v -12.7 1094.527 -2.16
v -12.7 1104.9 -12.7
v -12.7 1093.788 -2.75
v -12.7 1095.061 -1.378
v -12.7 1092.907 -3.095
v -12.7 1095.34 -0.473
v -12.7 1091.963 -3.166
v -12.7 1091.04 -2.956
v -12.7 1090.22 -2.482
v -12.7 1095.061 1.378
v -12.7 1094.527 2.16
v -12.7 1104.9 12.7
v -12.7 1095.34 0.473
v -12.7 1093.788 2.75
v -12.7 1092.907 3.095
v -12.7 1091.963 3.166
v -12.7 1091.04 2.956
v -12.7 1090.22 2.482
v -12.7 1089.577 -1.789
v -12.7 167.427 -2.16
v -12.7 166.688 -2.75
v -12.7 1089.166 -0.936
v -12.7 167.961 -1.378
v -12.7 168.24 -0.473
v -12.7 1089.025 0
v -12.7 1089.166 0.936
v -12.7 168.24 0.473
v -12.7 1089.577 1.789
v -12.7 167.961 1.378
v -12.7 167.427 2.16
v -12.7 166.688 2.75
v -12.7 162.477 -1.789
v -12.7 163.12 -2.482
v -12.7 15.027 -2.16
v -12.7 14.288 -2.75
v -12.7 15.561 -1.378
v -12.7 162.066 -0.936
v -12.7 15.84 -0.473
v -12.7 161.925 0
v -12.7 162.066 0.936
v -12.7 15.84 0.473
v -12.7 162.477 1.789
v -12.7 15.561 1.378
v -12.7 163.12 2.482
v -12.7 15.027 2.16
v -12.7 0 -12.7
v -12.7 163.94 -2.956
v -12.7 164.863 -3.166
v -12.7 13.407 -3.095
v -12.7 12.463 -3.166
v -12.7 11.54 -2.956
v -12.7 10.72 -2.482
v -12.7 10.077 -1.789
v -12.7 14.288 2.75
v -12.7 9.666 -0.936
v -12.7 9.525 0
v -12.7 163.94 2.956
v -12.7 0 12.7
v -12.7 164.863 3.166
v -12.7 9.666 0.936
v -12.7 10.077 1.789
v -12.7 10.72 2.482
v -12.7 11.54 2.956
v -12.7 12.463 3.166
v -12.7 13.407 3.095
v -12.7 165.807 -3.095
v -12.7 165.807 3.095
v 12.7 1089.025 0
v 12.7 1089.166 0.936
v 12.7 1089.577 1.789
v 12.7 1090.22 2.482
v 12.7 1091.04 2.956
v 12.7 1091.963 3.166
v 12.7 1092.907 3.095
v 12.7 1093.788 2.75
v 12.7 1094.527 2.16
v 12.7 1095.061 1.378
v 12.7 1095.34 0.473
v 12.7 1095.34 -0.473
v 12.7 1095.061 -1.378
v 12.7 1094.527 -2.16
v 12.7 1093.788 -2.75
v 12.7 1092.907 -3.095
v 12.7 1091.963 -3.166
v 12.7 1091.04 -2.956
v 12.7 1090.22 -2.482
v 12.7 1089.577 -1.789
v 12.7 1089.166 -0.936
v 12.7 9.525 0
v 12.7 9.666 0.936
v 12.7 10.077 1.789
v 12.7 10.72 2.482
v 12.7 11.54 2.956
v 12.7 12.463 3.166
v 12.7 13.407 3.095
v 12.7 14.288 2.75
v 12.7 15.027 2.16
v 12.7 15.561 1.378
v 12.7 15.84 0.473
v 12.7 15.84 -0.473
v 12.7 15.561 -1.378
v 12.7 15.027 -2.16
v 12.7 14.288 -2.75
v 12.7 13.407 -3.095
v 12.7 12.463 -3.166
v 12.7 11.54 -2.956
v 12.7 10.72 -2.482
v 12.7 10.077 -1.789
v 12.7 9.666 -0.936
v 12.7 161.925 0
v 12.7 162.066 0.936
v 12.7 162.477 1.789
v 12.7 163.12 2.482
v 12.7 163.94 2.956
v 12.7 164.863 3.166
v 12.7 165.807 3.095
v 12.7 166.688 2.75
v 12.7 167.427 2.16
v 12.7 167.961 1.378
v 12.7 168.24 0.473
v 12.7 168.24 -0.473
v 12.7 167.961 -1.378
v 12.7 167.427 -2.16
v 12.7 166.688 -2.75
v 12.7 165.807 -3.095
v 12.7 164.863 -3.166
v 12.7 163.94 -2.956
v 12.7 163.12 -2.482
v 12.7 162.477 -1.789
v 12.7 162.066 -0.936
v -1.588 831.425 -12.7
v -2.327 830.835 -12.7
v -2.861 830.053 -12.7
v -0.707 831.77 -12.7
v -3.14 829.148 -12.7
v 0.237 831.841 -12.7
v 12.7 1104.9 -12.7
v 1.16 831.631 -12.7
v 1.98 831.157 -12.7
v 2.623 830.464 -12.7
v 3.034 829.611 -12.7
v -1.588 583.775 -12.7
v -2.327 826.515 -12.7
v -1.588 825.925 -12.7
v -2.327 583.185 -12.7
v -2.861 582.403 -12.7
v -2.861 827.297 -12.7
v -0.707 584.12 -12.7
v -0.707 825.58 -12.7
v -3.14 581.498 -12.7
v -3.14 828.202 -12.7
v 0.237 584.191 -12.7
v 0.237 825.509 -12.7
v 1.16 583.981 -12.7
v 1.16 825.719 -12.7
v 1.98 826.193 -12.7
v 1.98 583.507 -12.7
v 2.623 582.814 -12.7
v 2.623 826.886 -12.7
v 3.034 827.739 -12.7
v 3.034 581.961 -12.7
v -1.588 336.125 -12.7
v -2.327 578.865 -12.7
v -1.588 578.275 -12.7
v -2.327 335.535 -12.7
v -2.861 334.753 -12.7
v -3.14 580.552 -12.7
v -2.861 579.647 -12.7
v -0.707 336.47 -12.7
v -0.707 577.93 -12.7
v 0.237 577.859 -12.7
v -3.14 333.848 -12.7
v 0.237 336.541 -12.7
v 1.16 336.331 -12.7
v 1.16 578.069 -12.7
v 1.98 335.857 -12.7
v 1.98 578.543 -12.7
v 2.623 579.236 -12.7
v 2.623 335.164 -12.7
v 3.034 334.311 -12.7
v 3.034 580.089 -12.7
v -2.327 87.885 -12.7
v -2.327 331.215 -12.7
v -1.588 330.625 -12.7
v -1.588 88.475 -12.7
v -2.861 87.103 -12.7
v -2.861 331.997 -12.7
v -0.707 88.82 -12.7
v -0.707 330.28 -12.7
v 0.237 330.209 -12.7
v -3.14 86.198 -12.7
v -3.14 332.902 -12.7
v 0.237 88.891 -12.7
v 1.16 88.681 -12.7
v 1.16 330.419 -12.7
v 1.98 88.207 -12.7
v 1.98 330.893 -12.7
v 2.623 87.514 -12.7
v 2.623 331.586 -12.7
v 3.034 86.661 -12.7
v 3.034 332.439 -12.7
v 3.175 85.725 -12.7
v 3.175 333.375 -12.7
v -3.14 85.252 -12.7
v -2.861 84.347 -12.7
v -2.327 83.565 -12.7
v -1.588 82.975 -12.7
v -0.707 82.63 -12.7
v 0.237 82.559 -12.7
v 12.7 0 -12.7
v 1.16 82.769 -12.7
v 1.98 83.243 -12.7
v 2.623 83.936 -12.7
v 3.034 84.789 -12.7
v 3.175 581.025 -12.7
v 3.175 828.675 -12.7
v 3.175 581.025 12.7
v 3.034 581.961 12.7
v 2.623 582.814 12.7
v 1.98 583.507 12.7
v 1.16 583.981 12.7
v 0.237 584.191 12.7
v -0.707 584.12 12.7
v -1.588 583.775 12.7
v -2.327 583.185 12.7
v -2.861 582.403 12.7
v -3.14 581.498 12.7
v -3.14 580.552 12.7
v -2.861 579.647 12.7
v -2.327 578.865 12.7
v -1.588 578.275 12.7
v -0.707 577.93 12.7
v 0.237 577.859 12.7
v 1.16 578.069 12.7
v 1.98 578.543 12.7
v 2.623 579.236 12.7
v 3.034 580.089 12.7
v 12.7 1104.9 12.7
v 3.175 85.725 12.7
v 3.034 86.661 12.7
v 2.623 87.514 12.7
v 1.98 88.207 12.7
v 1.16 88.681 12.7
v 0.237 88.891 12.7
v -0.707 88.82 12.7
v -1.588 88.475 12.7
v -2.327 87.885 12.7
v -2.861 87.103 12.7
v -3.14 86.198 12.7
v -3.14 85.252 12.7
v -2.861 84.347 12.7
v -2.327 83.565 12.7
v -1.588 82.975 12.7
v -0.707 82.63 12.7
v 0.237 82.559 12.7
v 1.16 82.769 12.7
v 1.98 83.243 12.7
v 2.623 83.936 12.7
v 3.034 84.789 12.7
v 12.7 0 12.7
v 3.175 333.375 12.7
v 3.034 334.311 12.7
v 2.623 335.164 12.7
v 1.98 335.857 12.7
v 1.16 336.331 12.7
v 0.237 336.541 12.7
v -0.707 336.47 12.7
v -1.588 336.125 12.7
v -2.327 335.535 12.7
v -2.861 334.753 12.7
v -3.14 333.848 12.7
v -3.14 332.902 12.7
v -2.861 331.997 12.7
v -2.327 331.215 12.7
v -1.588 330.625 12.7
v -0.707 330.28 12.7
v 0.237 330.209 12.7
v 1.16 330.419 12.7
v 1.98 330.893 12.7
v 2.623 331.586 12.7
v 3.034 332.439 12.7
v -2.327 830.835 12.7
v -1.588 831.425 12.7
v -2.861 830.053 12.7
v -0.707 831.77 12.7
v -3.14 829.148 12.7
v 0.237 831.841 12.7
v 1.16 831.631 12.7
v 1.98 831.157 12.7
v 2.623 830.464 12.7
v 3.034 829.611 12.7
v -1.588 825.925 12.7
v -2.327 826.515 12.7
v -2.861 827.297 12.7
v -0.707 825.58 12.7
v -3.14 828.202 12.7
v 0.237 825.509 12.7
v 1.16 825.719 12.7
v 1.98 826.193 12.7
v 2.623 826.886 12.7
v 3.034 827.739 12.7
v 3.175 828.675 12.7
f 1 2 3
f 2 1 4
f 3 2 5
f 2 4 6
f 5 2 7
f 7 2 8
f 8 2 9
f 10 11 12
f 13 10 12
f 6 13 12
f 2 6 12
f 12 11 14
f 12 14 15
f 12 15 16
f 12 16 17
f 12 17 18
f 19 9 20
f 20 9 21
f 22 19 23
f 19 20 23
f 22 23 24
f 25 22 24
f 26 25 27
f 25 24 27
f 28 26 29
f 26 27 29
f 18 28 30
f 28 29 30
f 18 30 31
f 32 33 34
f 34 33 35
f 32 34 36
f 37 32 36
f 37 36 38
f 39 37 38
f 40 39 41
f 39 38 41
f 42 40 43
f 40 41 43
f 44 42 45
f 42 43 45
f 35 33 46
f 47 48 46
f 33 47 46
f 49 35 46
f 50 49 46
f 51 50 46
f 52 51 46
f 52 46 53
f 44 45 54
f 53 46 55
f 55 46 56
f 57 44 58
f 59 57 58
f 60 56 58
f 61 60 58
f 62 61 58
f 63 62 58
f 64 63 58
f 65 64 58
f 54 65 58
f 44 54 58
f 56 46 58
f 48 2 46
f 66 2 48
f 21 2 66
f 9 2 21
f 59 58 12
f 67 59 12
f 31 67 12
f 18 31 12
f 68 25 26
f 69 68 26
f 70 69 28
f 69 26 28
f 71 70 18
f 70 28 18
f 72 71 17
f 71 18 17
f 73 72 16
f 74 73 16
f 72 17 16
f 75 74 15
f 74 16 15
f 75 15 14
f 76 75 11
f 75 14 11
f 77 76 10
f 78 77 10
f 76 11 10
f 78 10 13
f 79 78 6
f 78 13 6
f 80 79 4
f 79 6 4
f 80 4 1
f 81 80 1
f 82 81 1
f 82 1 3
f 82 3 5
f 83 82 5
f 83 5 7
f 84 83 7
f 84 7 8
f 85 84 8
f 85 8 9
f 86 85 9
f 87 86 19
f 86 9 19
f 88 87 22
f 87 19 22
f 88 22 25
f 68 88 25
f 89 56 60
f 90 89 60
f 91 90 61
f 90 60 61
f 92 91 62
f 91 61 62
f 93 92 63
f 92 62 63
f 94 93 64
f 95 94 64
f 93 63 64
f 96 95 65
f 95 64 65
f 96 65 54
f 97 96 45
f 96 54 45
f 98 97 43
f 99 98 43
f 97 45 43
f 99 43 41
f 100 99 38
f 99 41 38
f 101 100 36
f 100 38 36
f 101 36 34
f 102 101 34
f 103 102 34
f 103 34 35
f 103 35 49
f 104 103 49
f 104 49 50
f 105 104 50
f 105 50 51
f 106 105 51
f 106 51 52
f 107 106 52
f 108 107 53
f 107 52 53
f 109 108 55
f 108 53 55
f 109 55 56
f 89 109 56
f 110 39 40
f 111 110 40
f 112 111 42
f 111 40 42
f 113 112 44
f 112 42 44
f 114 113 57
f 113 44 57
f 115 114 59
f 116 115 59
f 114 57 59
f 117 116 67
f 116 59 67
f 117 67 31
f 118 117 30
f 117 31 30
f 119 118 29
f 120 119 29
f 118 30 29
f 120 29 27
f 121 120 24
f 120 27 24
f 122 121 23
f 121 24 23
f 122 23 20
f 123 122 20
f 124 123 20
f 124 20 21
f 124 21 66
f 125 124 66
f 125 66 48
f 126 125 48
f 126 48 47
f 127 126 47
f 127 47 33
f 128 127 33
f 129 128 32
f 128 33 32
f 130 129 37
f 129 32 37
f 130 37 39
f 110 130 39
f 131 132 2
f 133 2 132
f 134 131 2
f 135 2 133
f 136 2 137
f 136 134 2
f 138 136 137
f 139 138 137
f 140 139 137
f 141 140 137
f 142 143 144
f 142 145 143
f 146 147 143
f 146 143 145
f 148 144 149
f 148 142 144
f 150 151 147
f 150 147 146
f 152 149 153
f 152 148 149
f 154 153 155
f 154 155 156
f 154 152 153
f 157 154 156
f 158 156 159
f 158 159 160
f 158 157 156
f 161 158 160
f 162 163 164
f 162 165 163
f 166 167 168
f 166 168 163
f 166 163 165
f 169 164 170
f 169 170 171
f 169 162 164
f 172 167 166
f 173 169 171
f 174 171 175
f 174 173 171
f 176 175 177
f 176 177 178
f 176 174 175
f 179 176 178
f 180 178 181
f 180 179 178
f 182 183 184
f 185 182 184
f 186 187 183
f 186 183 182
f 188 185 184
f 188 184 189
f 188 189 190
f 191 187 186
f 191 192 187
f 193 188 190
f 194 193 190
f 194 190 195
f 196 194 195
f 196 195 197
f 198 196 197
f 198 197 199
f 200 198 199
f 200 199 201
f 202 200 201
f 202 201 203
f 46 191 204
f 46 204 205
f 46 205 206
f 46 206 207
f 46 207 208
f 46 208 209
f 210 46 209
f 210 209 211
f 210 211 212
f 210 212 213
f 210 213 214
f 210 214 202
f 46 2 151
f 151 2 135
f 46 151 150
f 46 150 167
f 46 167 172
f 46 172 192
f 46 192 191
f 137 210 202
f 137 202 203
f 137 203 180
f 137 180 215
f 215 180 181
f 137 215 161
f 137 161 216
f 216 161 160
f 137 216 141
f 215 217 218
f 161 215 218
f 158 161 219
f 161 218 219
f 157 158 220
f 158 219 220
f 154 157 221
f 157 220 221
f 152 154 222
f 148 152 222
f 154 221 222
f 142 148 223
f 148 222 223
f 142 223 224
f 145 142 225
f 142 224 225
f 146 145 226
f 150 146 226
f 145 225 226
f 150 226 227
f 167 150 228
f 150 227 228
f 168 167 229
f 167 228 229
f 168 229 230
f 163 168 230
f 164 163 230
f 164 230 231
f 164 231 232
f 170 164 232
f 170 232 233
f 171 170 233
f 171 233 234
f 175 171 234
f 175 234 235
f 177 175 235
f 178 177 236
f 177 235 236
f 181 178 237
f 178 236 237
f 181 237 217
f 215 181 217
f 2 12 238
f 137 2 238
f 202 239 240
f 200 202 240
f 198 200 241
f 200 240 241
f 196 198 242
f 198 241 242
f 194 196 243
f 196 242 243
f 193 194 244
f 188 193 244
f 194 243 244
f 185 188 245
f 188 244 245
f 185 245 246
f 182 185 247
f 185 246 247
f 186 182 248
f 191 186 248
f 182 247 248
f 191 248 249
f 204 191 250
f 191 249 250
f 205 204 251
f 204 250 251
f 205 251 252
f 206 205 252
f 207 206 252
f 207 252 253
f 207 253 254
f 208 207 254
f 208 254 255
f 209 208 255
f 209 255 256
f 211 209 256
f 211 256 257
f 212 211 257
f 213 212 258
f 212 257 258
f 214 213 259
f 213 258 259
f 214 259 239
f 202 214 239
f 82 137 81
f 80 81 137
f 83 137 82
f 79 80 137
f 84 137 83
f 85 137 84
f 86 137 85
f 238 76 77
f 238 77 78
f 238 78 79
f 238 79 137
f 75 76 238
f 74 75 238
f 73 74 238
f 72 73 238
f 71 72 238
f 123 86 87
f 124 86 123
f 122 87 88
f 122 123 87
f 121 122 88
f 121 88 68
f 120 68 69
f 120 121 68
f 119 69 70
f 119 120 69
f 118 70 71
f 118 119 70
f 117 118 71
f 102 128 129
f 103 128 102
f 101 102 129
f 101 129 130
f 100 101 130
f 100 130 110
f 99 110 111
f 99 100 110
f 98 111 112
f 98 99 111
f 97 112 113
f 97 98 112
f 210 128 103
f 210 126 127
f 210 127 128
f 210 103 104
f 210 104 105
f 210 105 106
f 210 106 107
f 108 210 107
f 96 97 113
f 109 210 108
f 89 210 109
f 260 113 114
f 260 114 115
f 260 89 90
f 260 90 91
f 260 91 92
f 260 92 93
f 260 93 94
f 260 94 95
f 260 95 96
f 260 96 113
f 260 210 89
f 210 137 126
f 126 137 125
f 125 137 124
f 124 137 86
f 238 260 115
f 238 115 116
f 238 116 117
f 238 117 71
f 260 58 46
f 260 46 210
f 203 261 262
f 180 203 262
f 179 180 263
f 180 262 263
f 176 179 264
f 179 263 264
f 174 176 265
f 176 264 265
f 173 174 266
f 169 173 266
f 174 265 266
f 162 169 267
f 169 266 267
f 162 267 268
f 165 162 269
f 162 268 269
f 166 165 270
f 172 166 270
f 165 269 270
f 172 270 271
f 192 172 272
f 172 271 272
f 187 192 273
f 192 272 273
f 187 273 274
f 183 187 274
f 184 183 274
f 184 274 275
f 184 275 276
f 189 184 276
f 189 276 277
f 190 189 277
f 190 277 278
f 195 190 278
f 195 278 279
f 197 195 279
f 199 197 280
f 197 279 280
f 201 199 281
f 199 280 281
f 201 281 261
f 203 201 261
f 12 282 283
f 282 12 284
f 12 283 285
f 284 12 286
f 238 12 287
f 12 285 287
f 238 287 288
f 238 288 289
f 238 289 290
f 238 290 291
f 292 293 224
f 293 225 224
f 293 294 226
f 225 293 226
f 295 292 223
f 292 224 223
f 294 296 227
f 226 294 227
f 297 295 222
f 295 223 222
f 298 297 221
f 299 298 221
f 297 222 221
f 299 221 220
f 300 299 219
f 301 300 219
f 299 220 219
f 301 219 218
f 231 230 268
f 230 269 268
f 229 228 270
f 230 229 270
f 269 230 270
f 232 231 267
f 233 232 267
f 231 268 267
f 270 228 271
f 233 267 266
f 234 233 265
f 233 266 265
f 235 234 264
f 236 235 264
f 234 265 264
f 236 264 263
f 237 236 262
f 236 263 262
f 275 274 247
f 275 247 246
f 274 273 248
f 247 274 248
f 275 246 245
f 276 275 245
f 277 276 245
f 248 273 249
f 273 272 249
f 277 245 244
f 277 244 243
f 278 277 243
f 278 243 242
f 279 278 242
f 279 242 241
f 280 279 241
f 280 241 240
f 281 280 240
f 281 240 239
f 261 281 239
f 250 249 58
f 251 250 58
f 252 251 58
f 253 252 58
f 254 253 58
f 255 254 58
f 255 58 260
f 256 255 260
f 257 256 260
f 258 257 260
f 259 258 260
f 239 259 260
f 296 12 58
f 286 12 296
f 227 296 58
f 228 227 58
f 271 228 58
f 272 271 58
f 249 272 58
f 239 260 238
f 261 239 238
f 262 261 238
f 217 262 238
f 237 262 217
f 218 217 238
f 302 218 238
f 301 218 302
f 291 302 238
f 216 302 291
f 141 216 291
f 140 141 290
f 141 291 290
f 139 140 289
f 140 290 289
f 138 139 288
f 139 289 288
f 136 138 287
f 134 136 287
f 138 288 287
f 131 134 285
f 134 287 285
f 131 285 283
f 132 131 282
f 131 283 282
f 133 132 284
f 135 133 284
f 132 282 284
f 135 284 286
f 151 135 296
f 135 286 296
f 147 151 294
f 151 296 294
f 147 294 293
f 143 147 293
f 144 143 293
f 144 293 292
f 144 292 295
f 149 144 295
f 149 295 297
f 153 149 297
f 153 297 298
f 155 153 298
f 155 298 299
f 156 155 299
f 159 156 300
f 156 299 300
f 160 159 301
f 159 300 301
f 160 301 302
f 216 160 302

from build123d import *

# Parameters (mm, degrees)
F0_W     = 25.4
F0_H     = 25.4
F1_DEPTH = 1104.9
F2_R     = 3.175
F3_DEPTH = 25.4
F4_R     = 3.175
F5_DEPTH = 25.4


with BuildPart() as f1:
    # F0 (on Front) → F1 (new body)
    with BuildSketch(Plane.XZ):
        Rectangle(F0_W, F0_H)
    extrude(amount=-F1_DEPTH)

    # F2 (on face) → F3 (cut, through all)
    with BuildSketch(Plane(origin=(-12.7, 0, 0), x_dir=(0, -1, 0), z_dir=(-1, 0, 0))):
        with Locations((-12.7, 0)):
            Circle(F2_R)
        with Locations((-165.1, 0)):
            Circle(F2_R)
        with Locations((-1092.2, 0)):
            Circle(F2_R)
    extrude(amount=-F3_DEPTH, mode=Mode.SUBTRACT)

    # F4 (on face) → F5 (cut, through all)
    with BuildSketch(Plane.XY.offset(12.7)):
        with Locations((0, 85.725)):
            Circle(F4_R)
        with Locations((0, 333.375)):
            Circle(F4_R)
        with Locations((0, 581.025)):
            Circle(F4_R)
        with Locations((0, 828.675)):
            Circle(F4_R)
    extrude(amount=-F5_DEPTH, mode=Mode.SUBTRACT)


solid = f1.part
